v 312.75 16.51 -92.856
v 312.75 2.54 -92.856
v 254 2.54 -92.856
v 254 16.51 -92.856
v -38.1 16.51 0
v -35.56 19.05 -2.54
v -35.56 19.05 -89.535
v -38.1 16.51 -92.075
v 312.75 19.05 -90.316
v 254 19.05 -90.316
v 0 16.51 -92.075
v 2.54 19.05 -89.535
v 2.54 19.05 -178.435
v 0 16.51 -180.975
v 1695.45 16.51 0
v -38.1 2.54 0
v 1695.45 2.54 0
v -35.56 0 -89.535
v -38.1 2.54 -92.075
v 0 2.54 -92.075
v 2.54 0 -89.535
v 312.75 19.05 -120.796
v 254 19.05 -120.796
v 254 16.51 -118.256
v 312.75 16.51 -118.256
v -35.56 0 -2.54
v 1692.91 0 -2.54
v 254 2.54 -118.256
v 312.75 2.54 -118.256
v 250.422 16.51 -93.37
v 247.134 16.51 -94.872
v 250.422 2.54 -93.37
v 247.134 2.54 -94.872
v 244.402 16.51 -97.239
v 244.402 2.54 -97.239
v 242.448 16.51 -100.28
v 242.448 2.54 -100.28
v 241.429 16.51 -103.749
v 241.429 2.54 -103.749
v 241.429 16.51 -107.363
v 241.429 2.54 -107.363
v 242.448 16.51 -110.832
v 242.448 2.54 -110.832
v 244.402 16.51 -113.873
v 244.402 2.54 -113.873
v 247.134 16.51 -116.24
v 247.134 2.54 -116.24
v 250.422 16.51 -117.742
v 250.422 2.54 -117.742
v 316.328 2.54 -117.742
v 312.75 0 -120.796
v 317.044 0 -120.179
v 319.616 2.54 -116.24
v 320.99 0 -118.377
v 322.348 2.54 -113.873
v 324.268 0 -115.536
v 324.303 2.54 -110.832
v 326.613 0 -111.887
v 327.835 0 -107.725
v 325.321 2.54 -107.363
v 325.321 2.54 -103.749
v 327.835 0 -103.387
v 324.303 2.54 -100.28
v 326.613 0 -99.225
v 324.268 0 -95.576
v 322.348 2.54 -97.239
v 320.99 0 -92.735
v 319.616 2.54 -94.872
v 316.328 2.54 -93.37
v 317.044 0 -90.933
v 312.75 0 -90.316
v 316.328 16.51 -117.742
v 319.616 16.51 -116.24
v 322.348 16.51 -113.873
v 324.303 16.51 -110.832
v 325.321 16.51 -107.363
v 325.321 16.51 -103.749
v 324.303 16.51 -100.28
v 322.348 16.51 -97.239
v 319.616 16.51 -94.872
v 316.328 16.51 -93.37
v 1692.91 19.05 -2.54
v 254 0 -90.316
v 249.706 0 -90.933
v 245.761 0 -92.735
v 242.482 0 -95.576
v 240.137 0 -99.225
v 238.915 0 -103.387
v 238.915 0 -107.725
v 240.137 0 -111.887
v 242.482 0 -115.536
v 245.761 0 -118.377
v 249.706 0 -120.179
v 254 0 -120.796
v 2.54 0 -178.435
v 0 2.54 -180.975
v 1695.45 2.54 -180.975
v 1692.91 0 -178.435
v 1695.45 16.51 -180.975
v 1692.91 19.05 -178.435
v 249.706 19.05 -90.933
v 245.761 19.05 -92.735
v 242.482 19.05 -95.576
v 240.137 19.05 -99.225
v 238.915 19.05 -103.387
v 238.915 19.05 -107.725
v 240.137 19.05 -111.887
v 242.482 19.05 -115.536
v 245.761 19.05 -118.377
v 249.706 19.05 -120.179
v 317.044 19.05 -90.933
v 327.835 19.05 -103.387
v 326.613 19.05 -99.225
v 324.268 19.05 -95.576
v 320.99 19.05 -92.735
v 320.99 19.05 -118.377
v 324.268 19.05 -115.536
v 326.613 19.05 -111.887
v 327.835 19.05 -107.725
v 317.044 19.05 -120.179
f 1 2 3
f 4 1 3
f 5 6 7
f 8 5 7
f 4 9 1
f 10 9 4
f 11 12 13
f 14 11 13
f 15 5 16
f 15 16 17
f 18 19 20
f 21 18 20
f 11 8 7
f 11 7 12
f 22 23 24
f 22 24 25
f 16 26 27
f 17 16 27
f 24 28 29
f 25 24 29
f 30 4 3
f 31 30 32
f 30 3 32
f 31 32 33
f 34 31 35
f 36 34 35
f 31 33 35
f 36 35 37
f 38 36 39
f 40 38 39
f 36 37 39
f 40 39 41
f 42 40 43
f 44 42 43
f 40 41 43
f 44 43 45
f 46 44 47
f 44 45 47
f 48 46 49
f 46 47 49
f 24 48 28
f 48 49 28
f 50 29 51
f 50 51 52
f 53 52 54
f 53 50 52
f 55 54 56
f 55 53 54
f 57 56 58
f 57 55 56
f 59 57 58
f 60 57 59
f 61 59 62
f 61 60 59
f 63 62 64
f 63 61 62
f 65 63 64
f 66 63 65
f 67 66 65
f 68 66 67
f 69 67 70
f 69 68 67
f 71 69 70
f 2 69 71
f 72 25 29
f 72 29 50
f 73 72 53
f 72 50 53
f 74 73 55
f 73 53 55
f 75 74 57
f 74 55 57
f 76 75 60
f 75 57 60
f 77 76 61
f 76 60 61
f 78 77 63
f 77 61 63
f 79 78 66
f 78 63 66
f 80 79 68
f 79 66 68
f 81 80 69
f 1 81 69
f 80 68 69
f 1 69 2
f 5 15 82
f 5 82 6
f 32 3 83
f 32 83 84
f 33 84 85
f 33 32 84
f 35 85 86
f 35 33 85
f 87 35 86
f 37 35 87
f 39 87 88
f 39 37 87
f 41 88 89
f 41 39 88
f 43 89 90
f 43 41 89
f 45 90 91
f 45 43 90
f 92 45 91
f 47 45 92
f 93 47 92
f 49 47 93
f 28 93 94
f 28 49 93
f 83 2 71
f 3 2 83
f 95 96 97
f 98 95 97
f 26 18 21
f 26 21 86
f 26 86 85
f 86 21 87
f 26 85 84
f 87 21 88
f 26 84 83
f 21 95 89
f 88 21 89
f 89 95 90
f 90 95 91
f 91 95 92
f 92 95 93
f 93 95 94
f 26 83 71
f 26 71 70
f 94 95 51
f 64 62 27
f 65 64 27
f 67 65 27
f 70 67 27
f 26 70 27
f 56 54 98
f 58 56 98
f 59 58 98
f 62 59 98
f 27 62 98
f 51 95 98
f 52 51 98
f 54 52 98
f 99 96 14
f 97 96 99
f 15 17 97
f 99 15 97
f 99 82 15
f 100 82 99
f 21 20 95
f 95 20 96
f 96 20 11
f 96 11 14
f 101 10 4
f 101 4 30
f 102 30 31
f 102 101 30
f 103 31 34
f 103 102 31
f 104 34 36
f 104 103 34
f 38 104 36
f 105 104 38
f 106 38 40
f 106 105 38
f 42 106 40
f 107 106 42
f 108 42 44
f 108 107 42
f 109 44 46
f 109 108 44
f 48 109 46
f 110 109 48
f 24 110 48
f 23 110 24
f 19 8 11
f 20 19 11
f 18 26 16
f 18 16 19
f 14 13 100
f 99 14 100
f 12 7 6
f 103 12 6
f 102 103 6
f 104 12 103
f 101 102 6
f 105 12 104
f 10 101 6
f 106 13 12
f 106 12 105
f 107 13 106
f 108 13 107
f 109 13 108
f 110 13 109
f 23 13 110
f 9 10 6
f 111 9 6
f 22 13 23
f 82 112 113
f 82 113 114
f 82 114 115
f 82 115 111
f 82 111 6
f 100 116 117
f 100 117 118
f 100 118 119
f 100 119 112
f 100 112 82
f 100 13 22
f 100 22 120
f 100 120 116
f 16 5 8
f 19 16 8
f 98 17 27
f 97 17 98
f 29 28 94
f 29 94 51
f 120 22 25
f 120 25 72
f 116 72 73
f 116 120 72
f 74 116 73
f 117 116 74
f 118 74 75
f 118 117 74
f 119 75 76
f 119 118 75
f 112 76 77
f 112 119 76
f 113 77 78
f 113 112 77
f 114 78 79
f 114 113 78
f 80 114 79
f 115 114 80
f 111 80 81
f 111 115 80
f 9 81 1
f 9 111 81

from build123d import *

# Parameters (mm, degrees)
SKETCH1_W           = 1695.45
SKETCH1_H           = 180.975
BOSS_EXTRUDE1_DEPTH = 19.05
SKETCH2_W           = 38.1
SKETCH2_H           = 92.075
BOSS_EXTRUDE3_DEPTH = 19.05
CHAMFER1_SIZE       = 2.54
CHAMFER2_SIZE       = 2.54


with BuildPart() as part:
    # Sketch1 → Boss-Extrude1 (new body)
    with BuildSketch(Plane(origin=(0, 0, 0), x_dir=(1, 0, 0), z_dir=(0, 1, 0))):
        with Locations((847.725, 90.4875)):
            Rectangle(SKETCH1_W, SKETCH1_H)
        with BuildLine():
            Line((254, 118.25605), (312.7502, 118.25605))
            ThreePointArc((312.7502, 118.25605), (325.4502, 105.55605), (312.7502, 92.85605))
            Line((312.7502, 92.85605), (254, 92.85605))
            ThreePointArc((254, 92.85605), (241.3, 105.55605), (254, 118.25605))
        make_face(mode=Mode.SUBTRACT)
    extrude(amount=BOSS_EXTRUDE1_DEPTH)

    # Sketch2 → Boss-Extrude3 (add, through all)
    with BuildSketch(Plane(origin=(0, 19.05, 0), x_dir=(1, 0, 0), z_dir=(0, 1, 0))):
        with Locations((-19.05, 46.0375)):
            Rectangle(SKETCH2_W, SKETCH2_H)
    extrude(amount=-BOSS_EXTRUDE3_DEPTH)

    # Chamfer1
    chamfer1_edges = [part.edges().sort_by_distance(p)[0] for p in [
        (1695.45, 19.05, -90.4875),
        (325.4502, 19.05, -105.55605),
        (847.725, 19.05, -180.975),
        (283.3751, 19.05, -118.25605),
        (241.3, 19.05, -105.55605),
        (283.3751, 19.05, -92.85605),
        (-19.05, 19.05, -92.075),
        (-38.1, 19.05, -46.0375),
        (0, 19.05, -136.525),
        (828.675, 19.05, 0),
    ]]
    chamfer(chamfer1_edges, length=CHAMFER1_SIZE)

    # Chamfer2
    chamfer2_edges = [part.edges().sort_by_distance(p)[0] for p in [
        (325.4502, 0, -105.55605),
        (283.3751, 0, -118.25605),
        (241.3, 0, -105.55605),
        (283.3751, 0, -92.85605),
        (-38.1, 0, -46.0375),
        (-19.05, 0, -92.075),
        (847.725, 0, -180.975),
        (1695.45, 0, -90.4875),
        (828.675, 0, 0),
        (0, 0, -136.525),
    ]]
    chamfer(chamfer2_edges, length=CHAMFER2_SIZE)


solid = part.part
